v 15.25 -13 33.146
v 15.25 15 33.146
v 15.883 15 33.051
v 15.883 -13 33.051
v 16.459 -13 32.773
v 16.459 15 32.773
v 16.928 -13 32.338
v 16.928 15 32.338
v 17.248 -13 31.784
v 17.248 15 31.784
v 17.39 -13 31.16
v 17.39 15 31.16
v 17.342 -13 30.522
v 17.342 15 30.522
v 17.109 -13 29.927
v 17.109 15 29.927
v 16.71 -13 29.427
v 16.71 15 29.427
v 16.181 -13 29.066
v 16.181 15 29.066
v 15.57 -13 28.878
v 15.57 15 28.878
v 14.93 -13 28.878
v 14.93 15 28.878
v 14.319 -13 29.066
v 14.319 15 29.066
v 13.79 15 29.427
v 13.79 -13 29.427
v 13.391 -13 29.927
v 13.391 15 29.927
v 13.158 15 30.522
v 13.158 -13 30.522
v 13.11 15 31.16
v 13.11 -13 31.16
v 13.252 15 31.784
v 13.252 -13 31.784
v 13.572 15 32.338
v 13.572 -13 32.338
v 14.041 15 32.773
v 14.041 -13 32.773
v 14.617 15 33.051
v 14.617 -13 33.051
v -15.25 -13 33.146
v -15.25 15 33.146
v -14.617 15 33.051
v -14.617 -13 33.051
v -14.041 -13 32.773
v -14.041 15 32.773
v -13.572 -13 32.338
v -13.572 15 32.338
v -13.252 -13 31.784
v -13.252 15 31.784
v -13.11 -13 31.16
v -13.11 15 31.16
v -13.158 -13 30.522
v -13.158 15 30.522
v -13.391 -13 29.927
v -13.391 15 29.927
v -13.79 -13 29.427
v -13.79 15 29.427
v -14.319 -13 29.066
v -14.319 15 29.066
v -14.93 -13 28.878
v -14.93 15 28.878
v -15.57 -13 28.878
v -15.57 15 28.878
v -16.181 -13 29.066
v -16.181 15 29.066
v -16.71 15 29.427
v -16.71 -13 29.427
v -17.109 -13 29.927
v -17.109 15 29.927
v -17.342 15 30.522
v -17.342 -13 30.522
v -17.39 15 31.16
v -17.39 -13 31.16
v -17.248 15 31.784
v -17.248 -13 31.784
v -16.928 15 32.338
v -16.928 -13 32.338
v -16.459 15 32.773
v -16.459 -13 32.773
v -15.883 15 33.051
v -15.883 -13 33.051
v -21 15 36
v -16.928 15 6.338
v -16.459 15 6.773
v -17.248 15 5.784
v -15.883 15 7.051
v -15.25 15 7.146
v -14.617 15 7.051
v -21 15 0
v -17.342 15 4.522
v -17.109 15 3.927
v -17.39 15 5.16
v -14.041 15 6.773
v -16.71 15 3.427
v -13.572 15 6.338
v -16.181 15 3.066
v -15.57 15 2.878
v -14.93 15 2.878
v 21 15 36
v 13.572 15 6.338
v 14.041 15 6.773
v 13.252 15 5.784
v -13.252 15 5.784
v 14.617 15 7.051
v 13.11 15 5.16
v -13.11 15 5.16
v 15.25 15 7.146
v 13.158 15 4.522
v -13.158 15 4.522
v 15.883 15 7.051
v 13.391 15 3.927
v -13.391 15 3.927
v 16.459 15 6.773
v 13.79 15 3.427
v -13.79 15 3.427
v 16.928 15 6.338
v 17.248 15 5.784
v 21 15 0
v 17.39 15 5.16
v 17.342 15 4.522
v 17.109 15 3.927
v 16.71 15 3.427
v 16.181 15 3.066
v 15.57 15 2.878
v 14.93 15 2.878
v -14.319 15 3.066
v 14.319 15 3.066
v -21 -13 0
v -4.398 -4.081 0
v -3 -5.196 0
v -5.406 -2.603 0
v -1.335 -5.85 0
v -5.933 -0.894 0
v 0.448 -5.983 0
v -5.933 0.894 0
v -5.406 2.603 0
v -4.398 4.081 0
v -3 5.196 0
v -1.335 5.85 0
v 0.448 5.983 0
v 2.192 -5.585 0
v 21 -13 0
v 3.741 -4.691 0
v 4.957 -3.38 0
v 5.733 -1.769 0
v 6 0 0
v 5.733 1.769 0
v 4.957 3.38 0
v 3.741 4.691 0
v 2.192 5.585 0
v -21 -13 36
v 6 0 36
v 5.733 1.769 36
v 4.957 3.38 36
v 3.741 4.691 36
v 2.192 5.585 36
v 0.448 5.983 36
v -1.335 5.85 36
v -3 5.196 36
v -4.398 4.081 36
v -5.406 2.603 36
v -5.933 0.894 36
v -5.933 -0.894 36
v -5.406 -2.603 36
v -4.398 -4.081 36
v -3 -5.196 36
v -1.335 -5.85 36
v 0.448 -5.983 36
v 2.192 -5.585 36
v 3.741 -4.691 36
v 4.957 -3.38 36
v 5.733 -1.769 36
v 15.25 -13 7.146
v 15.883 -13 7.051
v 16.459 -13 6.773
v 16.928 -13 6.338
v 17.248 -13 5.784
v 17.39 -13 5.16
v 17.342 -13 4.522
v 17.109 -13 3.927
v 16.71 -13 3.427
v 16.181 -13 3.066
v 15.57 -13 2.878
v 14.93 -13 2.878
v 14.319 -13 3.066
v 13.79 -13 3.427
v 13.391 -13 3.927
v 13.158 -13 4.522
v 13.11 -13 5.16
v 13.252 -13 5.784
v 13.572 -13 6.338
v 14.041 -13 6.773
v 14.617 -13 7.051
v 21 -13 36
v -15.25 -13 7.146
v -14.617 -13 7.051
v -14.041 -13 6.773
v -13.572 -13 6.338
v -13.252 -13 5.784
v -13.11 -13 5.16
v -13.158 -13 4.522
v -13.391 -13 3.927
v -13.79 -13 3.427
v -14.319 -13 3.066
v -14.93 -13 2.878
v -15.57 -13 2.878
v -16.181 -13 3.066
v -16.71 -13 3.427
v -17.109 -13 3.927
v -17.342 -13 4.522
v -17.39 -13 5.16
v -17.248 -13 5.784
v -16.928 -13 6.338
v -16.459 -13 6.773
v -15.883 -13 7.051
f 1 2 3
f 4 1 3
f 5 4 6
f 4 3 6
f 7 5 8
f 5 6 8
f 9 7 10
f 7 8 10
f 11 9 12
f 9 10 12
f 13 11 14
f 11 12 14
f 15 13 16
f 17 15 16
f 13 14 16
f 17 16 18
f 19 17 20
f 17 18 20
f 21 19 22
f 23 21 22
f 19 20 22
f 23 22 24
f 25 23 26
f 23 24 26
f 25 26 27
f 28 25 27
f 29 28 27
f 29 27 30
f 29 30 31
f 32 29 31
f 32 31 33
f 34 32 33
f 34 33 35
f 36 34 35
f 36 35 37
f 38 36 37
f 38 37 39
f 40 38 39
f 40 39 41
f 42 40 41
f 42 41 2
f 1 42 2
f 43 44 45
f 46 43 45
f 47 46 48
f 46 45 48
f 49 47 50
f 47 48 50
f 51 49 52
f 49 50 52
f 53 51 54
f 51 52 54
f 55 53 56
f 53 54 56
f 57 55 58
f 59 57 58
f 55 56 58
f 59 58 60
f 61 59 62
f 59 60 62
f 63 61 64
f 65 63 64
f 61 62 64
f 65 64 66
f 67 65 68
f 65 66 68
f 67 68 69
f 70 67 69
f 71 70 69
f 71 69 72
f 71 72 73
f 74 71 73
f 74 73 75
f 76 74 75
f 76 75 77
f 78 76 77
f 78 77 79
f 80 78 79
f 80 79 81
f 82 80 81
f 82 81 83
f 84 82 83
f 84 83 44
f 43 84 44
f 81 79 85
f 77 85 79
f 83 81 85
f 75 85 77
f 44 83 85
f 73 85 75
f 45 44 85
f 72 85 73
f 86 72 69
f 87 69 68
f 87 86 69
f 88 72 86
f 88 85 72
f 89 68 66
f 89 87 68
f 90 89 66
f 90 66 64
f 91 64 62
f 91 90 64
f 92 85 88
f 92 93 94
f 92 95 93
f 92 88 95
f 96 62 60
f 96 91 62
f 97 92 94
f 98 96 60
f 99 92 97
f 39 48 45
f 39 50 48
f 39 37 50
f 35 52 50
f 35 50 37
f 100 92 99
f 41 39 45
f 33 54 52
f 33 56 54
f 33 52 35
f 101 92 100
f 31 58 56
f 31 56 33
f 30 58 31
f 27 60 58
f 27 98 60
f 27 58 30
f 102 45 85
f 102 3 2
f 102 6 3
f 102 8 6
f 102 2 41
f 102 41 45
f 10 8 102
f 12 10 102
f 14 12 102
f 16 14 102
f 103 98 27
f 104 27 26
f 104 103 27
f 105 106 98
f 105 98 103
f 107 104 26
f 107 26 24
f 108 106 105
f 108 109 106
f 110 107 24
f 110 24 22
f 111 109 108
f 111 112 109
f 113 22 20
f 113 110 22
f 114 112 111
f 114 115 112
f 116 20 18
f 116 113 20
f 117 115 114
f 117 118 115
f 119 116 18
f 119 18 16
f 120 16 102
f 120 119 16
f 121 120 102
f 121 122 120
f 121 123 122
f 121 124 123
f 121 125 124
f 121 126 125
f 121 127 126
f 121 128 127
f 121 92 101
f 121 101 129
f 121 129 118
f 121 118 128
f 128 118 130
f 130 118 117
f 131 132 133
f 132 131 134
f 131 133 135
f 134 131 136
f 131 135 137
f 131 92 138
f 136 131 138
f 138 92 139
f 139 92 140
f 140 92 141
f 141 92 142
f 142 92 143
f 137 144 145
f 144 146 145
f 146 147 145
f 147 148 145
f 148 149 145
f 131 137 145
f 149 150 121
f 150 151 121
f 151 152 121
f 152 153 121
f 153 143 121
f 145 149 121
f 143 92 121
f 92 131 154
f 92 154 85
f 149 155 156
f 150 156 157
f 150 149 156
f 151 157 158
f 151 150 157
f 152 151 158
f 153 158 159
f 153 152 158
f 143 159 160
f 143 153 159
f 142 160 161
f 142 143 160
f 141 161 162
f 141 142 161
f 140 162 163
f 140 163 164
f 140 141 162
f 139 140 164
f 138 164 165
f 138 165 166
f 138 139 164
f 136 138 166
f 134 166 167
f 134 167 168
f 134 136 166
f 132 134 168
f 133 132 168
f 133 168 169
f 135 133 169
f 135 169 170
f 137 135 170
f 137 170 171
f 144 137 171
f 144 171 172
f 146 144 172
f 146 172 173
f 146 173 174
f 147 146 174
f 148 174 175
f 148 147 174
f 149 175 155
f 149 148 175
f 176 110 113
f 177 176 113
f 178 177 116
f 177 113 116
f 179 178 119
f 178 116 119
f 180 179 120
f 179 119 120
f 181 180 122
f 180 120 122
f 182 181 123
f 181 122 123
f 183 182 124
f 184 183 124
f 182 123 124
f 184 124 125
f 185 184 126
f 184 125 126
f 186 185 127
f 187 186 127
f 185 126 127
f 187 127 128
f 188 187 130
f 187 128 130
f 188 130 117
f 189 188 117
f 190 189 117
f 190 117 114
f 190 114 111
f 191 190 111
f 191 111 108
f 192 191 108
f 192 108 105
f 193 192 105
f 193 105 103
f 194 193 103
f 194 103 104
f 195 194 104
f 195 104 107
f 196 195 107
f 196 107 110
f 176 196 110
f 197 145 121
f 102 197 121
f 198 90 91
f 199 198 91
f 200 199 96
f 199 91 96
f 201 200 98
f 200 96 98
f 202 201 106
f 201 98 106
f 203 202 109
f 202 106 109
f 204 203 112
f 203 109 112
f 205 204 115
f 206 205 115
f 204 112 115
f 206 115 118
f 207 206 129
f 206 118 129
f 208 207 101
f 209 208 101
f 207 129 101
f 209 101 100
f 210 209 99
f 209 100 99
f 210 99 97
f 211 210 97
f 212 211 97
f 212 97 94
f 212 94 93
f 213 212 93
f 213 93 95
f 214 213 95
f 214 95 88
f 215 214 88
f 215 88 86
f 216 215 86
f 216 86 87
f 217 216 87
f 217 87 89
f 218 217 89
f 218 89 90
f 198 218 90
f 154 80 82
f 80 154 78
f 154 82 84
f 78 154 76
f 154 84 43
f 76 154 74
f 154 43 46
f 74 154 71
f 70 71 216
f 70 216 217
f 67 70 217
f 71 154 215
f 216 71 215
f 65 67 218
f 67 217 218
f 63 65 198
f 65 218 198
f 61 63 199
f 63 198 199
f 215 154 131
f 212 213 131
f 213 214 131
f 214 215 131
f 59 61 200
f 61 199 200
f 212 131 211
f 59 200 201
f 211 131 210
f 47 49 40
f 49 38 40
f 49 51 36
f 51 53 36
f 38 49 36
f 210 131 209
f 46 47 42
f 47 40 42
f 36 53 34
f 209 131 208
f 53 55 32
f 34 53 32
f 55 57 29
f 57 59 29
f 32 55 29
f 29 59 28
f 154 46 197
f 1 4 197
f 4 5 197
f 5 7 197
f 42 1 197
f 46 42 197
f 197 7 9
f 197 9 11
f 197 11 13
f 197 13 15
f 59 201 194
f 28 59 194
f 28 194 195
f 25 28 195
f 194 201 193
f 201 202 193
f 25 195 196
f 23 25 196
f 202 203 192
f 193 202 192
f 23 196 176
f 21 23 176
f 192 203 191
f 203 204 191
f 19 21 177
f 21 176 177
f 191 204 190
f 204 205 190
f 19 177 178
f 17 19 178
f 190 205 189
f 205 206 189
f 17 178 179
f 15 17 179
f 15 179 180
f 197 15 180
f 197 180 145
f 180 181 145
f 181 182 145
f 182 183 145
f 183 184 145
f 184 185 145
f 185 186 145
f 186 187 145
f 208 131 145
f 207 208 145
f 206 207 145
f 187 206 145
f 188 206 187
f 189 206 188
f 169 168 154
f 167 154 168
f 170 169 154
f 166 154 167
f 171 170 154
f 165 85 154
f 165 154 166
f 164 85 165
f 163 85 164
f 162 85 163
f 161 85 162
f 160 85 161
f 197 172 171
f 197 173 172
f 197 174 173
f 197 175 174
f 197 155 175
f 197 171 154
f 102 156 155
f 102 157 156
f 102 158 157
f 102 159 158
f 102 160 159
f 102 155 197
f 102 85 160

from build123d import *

# Parameters (mm, degrees)
SKETCH1_W           = 42
SKETCH1_H           = 28
SKETCH1_R           = 6
BOSS_EXTRUDE1_DEPTH = 36
SKETCH2_R           = 2.1463
CUT_EXTRUDE1_DEPTH  = 51.209560843


with BuildPart() as part:
    # Sketch1 → Boss-Extrude1 (new body)
    with BuildSketch(Plane.XY):
        with Locations((0, 1)):
            Rectangle(SKETCH1_W, SKETCH1_H)
        Circle(SKETCH1_R, mode=Mode.SUBTRACT)
    extrude(amount=BOSS_EXTRUDE1_DEPTH)

    # Sketch2 → Cut-Extrude1 (cut, through all)
    with BuildSketch(Plane(origin=(0, 15, 0), x_dir=(1, 0, 0), z_dir=(0, 1, 0))):
        with Locations(Location((-15.25, -5, 0), (0, 0, 270))):
            Circle(SKETCH2_R)
        with Locations(Location((15.25, -5, 0), (0, 0, 270))):
            Circle(SKETCH2_R)
        with Locations(Location((15.25, -31, 0), (0, 0, 270))):
            Circle(SKETCH2_R)
        with Locations(Location((-15.25, -31, 0), (0, 0, 270))):
            Circle(SKETCH2_R)
    extrude(amount=-CUT_EXTRUDE1_DEPTH, mode=Mode.SUBTRACT)


solid = part.part
